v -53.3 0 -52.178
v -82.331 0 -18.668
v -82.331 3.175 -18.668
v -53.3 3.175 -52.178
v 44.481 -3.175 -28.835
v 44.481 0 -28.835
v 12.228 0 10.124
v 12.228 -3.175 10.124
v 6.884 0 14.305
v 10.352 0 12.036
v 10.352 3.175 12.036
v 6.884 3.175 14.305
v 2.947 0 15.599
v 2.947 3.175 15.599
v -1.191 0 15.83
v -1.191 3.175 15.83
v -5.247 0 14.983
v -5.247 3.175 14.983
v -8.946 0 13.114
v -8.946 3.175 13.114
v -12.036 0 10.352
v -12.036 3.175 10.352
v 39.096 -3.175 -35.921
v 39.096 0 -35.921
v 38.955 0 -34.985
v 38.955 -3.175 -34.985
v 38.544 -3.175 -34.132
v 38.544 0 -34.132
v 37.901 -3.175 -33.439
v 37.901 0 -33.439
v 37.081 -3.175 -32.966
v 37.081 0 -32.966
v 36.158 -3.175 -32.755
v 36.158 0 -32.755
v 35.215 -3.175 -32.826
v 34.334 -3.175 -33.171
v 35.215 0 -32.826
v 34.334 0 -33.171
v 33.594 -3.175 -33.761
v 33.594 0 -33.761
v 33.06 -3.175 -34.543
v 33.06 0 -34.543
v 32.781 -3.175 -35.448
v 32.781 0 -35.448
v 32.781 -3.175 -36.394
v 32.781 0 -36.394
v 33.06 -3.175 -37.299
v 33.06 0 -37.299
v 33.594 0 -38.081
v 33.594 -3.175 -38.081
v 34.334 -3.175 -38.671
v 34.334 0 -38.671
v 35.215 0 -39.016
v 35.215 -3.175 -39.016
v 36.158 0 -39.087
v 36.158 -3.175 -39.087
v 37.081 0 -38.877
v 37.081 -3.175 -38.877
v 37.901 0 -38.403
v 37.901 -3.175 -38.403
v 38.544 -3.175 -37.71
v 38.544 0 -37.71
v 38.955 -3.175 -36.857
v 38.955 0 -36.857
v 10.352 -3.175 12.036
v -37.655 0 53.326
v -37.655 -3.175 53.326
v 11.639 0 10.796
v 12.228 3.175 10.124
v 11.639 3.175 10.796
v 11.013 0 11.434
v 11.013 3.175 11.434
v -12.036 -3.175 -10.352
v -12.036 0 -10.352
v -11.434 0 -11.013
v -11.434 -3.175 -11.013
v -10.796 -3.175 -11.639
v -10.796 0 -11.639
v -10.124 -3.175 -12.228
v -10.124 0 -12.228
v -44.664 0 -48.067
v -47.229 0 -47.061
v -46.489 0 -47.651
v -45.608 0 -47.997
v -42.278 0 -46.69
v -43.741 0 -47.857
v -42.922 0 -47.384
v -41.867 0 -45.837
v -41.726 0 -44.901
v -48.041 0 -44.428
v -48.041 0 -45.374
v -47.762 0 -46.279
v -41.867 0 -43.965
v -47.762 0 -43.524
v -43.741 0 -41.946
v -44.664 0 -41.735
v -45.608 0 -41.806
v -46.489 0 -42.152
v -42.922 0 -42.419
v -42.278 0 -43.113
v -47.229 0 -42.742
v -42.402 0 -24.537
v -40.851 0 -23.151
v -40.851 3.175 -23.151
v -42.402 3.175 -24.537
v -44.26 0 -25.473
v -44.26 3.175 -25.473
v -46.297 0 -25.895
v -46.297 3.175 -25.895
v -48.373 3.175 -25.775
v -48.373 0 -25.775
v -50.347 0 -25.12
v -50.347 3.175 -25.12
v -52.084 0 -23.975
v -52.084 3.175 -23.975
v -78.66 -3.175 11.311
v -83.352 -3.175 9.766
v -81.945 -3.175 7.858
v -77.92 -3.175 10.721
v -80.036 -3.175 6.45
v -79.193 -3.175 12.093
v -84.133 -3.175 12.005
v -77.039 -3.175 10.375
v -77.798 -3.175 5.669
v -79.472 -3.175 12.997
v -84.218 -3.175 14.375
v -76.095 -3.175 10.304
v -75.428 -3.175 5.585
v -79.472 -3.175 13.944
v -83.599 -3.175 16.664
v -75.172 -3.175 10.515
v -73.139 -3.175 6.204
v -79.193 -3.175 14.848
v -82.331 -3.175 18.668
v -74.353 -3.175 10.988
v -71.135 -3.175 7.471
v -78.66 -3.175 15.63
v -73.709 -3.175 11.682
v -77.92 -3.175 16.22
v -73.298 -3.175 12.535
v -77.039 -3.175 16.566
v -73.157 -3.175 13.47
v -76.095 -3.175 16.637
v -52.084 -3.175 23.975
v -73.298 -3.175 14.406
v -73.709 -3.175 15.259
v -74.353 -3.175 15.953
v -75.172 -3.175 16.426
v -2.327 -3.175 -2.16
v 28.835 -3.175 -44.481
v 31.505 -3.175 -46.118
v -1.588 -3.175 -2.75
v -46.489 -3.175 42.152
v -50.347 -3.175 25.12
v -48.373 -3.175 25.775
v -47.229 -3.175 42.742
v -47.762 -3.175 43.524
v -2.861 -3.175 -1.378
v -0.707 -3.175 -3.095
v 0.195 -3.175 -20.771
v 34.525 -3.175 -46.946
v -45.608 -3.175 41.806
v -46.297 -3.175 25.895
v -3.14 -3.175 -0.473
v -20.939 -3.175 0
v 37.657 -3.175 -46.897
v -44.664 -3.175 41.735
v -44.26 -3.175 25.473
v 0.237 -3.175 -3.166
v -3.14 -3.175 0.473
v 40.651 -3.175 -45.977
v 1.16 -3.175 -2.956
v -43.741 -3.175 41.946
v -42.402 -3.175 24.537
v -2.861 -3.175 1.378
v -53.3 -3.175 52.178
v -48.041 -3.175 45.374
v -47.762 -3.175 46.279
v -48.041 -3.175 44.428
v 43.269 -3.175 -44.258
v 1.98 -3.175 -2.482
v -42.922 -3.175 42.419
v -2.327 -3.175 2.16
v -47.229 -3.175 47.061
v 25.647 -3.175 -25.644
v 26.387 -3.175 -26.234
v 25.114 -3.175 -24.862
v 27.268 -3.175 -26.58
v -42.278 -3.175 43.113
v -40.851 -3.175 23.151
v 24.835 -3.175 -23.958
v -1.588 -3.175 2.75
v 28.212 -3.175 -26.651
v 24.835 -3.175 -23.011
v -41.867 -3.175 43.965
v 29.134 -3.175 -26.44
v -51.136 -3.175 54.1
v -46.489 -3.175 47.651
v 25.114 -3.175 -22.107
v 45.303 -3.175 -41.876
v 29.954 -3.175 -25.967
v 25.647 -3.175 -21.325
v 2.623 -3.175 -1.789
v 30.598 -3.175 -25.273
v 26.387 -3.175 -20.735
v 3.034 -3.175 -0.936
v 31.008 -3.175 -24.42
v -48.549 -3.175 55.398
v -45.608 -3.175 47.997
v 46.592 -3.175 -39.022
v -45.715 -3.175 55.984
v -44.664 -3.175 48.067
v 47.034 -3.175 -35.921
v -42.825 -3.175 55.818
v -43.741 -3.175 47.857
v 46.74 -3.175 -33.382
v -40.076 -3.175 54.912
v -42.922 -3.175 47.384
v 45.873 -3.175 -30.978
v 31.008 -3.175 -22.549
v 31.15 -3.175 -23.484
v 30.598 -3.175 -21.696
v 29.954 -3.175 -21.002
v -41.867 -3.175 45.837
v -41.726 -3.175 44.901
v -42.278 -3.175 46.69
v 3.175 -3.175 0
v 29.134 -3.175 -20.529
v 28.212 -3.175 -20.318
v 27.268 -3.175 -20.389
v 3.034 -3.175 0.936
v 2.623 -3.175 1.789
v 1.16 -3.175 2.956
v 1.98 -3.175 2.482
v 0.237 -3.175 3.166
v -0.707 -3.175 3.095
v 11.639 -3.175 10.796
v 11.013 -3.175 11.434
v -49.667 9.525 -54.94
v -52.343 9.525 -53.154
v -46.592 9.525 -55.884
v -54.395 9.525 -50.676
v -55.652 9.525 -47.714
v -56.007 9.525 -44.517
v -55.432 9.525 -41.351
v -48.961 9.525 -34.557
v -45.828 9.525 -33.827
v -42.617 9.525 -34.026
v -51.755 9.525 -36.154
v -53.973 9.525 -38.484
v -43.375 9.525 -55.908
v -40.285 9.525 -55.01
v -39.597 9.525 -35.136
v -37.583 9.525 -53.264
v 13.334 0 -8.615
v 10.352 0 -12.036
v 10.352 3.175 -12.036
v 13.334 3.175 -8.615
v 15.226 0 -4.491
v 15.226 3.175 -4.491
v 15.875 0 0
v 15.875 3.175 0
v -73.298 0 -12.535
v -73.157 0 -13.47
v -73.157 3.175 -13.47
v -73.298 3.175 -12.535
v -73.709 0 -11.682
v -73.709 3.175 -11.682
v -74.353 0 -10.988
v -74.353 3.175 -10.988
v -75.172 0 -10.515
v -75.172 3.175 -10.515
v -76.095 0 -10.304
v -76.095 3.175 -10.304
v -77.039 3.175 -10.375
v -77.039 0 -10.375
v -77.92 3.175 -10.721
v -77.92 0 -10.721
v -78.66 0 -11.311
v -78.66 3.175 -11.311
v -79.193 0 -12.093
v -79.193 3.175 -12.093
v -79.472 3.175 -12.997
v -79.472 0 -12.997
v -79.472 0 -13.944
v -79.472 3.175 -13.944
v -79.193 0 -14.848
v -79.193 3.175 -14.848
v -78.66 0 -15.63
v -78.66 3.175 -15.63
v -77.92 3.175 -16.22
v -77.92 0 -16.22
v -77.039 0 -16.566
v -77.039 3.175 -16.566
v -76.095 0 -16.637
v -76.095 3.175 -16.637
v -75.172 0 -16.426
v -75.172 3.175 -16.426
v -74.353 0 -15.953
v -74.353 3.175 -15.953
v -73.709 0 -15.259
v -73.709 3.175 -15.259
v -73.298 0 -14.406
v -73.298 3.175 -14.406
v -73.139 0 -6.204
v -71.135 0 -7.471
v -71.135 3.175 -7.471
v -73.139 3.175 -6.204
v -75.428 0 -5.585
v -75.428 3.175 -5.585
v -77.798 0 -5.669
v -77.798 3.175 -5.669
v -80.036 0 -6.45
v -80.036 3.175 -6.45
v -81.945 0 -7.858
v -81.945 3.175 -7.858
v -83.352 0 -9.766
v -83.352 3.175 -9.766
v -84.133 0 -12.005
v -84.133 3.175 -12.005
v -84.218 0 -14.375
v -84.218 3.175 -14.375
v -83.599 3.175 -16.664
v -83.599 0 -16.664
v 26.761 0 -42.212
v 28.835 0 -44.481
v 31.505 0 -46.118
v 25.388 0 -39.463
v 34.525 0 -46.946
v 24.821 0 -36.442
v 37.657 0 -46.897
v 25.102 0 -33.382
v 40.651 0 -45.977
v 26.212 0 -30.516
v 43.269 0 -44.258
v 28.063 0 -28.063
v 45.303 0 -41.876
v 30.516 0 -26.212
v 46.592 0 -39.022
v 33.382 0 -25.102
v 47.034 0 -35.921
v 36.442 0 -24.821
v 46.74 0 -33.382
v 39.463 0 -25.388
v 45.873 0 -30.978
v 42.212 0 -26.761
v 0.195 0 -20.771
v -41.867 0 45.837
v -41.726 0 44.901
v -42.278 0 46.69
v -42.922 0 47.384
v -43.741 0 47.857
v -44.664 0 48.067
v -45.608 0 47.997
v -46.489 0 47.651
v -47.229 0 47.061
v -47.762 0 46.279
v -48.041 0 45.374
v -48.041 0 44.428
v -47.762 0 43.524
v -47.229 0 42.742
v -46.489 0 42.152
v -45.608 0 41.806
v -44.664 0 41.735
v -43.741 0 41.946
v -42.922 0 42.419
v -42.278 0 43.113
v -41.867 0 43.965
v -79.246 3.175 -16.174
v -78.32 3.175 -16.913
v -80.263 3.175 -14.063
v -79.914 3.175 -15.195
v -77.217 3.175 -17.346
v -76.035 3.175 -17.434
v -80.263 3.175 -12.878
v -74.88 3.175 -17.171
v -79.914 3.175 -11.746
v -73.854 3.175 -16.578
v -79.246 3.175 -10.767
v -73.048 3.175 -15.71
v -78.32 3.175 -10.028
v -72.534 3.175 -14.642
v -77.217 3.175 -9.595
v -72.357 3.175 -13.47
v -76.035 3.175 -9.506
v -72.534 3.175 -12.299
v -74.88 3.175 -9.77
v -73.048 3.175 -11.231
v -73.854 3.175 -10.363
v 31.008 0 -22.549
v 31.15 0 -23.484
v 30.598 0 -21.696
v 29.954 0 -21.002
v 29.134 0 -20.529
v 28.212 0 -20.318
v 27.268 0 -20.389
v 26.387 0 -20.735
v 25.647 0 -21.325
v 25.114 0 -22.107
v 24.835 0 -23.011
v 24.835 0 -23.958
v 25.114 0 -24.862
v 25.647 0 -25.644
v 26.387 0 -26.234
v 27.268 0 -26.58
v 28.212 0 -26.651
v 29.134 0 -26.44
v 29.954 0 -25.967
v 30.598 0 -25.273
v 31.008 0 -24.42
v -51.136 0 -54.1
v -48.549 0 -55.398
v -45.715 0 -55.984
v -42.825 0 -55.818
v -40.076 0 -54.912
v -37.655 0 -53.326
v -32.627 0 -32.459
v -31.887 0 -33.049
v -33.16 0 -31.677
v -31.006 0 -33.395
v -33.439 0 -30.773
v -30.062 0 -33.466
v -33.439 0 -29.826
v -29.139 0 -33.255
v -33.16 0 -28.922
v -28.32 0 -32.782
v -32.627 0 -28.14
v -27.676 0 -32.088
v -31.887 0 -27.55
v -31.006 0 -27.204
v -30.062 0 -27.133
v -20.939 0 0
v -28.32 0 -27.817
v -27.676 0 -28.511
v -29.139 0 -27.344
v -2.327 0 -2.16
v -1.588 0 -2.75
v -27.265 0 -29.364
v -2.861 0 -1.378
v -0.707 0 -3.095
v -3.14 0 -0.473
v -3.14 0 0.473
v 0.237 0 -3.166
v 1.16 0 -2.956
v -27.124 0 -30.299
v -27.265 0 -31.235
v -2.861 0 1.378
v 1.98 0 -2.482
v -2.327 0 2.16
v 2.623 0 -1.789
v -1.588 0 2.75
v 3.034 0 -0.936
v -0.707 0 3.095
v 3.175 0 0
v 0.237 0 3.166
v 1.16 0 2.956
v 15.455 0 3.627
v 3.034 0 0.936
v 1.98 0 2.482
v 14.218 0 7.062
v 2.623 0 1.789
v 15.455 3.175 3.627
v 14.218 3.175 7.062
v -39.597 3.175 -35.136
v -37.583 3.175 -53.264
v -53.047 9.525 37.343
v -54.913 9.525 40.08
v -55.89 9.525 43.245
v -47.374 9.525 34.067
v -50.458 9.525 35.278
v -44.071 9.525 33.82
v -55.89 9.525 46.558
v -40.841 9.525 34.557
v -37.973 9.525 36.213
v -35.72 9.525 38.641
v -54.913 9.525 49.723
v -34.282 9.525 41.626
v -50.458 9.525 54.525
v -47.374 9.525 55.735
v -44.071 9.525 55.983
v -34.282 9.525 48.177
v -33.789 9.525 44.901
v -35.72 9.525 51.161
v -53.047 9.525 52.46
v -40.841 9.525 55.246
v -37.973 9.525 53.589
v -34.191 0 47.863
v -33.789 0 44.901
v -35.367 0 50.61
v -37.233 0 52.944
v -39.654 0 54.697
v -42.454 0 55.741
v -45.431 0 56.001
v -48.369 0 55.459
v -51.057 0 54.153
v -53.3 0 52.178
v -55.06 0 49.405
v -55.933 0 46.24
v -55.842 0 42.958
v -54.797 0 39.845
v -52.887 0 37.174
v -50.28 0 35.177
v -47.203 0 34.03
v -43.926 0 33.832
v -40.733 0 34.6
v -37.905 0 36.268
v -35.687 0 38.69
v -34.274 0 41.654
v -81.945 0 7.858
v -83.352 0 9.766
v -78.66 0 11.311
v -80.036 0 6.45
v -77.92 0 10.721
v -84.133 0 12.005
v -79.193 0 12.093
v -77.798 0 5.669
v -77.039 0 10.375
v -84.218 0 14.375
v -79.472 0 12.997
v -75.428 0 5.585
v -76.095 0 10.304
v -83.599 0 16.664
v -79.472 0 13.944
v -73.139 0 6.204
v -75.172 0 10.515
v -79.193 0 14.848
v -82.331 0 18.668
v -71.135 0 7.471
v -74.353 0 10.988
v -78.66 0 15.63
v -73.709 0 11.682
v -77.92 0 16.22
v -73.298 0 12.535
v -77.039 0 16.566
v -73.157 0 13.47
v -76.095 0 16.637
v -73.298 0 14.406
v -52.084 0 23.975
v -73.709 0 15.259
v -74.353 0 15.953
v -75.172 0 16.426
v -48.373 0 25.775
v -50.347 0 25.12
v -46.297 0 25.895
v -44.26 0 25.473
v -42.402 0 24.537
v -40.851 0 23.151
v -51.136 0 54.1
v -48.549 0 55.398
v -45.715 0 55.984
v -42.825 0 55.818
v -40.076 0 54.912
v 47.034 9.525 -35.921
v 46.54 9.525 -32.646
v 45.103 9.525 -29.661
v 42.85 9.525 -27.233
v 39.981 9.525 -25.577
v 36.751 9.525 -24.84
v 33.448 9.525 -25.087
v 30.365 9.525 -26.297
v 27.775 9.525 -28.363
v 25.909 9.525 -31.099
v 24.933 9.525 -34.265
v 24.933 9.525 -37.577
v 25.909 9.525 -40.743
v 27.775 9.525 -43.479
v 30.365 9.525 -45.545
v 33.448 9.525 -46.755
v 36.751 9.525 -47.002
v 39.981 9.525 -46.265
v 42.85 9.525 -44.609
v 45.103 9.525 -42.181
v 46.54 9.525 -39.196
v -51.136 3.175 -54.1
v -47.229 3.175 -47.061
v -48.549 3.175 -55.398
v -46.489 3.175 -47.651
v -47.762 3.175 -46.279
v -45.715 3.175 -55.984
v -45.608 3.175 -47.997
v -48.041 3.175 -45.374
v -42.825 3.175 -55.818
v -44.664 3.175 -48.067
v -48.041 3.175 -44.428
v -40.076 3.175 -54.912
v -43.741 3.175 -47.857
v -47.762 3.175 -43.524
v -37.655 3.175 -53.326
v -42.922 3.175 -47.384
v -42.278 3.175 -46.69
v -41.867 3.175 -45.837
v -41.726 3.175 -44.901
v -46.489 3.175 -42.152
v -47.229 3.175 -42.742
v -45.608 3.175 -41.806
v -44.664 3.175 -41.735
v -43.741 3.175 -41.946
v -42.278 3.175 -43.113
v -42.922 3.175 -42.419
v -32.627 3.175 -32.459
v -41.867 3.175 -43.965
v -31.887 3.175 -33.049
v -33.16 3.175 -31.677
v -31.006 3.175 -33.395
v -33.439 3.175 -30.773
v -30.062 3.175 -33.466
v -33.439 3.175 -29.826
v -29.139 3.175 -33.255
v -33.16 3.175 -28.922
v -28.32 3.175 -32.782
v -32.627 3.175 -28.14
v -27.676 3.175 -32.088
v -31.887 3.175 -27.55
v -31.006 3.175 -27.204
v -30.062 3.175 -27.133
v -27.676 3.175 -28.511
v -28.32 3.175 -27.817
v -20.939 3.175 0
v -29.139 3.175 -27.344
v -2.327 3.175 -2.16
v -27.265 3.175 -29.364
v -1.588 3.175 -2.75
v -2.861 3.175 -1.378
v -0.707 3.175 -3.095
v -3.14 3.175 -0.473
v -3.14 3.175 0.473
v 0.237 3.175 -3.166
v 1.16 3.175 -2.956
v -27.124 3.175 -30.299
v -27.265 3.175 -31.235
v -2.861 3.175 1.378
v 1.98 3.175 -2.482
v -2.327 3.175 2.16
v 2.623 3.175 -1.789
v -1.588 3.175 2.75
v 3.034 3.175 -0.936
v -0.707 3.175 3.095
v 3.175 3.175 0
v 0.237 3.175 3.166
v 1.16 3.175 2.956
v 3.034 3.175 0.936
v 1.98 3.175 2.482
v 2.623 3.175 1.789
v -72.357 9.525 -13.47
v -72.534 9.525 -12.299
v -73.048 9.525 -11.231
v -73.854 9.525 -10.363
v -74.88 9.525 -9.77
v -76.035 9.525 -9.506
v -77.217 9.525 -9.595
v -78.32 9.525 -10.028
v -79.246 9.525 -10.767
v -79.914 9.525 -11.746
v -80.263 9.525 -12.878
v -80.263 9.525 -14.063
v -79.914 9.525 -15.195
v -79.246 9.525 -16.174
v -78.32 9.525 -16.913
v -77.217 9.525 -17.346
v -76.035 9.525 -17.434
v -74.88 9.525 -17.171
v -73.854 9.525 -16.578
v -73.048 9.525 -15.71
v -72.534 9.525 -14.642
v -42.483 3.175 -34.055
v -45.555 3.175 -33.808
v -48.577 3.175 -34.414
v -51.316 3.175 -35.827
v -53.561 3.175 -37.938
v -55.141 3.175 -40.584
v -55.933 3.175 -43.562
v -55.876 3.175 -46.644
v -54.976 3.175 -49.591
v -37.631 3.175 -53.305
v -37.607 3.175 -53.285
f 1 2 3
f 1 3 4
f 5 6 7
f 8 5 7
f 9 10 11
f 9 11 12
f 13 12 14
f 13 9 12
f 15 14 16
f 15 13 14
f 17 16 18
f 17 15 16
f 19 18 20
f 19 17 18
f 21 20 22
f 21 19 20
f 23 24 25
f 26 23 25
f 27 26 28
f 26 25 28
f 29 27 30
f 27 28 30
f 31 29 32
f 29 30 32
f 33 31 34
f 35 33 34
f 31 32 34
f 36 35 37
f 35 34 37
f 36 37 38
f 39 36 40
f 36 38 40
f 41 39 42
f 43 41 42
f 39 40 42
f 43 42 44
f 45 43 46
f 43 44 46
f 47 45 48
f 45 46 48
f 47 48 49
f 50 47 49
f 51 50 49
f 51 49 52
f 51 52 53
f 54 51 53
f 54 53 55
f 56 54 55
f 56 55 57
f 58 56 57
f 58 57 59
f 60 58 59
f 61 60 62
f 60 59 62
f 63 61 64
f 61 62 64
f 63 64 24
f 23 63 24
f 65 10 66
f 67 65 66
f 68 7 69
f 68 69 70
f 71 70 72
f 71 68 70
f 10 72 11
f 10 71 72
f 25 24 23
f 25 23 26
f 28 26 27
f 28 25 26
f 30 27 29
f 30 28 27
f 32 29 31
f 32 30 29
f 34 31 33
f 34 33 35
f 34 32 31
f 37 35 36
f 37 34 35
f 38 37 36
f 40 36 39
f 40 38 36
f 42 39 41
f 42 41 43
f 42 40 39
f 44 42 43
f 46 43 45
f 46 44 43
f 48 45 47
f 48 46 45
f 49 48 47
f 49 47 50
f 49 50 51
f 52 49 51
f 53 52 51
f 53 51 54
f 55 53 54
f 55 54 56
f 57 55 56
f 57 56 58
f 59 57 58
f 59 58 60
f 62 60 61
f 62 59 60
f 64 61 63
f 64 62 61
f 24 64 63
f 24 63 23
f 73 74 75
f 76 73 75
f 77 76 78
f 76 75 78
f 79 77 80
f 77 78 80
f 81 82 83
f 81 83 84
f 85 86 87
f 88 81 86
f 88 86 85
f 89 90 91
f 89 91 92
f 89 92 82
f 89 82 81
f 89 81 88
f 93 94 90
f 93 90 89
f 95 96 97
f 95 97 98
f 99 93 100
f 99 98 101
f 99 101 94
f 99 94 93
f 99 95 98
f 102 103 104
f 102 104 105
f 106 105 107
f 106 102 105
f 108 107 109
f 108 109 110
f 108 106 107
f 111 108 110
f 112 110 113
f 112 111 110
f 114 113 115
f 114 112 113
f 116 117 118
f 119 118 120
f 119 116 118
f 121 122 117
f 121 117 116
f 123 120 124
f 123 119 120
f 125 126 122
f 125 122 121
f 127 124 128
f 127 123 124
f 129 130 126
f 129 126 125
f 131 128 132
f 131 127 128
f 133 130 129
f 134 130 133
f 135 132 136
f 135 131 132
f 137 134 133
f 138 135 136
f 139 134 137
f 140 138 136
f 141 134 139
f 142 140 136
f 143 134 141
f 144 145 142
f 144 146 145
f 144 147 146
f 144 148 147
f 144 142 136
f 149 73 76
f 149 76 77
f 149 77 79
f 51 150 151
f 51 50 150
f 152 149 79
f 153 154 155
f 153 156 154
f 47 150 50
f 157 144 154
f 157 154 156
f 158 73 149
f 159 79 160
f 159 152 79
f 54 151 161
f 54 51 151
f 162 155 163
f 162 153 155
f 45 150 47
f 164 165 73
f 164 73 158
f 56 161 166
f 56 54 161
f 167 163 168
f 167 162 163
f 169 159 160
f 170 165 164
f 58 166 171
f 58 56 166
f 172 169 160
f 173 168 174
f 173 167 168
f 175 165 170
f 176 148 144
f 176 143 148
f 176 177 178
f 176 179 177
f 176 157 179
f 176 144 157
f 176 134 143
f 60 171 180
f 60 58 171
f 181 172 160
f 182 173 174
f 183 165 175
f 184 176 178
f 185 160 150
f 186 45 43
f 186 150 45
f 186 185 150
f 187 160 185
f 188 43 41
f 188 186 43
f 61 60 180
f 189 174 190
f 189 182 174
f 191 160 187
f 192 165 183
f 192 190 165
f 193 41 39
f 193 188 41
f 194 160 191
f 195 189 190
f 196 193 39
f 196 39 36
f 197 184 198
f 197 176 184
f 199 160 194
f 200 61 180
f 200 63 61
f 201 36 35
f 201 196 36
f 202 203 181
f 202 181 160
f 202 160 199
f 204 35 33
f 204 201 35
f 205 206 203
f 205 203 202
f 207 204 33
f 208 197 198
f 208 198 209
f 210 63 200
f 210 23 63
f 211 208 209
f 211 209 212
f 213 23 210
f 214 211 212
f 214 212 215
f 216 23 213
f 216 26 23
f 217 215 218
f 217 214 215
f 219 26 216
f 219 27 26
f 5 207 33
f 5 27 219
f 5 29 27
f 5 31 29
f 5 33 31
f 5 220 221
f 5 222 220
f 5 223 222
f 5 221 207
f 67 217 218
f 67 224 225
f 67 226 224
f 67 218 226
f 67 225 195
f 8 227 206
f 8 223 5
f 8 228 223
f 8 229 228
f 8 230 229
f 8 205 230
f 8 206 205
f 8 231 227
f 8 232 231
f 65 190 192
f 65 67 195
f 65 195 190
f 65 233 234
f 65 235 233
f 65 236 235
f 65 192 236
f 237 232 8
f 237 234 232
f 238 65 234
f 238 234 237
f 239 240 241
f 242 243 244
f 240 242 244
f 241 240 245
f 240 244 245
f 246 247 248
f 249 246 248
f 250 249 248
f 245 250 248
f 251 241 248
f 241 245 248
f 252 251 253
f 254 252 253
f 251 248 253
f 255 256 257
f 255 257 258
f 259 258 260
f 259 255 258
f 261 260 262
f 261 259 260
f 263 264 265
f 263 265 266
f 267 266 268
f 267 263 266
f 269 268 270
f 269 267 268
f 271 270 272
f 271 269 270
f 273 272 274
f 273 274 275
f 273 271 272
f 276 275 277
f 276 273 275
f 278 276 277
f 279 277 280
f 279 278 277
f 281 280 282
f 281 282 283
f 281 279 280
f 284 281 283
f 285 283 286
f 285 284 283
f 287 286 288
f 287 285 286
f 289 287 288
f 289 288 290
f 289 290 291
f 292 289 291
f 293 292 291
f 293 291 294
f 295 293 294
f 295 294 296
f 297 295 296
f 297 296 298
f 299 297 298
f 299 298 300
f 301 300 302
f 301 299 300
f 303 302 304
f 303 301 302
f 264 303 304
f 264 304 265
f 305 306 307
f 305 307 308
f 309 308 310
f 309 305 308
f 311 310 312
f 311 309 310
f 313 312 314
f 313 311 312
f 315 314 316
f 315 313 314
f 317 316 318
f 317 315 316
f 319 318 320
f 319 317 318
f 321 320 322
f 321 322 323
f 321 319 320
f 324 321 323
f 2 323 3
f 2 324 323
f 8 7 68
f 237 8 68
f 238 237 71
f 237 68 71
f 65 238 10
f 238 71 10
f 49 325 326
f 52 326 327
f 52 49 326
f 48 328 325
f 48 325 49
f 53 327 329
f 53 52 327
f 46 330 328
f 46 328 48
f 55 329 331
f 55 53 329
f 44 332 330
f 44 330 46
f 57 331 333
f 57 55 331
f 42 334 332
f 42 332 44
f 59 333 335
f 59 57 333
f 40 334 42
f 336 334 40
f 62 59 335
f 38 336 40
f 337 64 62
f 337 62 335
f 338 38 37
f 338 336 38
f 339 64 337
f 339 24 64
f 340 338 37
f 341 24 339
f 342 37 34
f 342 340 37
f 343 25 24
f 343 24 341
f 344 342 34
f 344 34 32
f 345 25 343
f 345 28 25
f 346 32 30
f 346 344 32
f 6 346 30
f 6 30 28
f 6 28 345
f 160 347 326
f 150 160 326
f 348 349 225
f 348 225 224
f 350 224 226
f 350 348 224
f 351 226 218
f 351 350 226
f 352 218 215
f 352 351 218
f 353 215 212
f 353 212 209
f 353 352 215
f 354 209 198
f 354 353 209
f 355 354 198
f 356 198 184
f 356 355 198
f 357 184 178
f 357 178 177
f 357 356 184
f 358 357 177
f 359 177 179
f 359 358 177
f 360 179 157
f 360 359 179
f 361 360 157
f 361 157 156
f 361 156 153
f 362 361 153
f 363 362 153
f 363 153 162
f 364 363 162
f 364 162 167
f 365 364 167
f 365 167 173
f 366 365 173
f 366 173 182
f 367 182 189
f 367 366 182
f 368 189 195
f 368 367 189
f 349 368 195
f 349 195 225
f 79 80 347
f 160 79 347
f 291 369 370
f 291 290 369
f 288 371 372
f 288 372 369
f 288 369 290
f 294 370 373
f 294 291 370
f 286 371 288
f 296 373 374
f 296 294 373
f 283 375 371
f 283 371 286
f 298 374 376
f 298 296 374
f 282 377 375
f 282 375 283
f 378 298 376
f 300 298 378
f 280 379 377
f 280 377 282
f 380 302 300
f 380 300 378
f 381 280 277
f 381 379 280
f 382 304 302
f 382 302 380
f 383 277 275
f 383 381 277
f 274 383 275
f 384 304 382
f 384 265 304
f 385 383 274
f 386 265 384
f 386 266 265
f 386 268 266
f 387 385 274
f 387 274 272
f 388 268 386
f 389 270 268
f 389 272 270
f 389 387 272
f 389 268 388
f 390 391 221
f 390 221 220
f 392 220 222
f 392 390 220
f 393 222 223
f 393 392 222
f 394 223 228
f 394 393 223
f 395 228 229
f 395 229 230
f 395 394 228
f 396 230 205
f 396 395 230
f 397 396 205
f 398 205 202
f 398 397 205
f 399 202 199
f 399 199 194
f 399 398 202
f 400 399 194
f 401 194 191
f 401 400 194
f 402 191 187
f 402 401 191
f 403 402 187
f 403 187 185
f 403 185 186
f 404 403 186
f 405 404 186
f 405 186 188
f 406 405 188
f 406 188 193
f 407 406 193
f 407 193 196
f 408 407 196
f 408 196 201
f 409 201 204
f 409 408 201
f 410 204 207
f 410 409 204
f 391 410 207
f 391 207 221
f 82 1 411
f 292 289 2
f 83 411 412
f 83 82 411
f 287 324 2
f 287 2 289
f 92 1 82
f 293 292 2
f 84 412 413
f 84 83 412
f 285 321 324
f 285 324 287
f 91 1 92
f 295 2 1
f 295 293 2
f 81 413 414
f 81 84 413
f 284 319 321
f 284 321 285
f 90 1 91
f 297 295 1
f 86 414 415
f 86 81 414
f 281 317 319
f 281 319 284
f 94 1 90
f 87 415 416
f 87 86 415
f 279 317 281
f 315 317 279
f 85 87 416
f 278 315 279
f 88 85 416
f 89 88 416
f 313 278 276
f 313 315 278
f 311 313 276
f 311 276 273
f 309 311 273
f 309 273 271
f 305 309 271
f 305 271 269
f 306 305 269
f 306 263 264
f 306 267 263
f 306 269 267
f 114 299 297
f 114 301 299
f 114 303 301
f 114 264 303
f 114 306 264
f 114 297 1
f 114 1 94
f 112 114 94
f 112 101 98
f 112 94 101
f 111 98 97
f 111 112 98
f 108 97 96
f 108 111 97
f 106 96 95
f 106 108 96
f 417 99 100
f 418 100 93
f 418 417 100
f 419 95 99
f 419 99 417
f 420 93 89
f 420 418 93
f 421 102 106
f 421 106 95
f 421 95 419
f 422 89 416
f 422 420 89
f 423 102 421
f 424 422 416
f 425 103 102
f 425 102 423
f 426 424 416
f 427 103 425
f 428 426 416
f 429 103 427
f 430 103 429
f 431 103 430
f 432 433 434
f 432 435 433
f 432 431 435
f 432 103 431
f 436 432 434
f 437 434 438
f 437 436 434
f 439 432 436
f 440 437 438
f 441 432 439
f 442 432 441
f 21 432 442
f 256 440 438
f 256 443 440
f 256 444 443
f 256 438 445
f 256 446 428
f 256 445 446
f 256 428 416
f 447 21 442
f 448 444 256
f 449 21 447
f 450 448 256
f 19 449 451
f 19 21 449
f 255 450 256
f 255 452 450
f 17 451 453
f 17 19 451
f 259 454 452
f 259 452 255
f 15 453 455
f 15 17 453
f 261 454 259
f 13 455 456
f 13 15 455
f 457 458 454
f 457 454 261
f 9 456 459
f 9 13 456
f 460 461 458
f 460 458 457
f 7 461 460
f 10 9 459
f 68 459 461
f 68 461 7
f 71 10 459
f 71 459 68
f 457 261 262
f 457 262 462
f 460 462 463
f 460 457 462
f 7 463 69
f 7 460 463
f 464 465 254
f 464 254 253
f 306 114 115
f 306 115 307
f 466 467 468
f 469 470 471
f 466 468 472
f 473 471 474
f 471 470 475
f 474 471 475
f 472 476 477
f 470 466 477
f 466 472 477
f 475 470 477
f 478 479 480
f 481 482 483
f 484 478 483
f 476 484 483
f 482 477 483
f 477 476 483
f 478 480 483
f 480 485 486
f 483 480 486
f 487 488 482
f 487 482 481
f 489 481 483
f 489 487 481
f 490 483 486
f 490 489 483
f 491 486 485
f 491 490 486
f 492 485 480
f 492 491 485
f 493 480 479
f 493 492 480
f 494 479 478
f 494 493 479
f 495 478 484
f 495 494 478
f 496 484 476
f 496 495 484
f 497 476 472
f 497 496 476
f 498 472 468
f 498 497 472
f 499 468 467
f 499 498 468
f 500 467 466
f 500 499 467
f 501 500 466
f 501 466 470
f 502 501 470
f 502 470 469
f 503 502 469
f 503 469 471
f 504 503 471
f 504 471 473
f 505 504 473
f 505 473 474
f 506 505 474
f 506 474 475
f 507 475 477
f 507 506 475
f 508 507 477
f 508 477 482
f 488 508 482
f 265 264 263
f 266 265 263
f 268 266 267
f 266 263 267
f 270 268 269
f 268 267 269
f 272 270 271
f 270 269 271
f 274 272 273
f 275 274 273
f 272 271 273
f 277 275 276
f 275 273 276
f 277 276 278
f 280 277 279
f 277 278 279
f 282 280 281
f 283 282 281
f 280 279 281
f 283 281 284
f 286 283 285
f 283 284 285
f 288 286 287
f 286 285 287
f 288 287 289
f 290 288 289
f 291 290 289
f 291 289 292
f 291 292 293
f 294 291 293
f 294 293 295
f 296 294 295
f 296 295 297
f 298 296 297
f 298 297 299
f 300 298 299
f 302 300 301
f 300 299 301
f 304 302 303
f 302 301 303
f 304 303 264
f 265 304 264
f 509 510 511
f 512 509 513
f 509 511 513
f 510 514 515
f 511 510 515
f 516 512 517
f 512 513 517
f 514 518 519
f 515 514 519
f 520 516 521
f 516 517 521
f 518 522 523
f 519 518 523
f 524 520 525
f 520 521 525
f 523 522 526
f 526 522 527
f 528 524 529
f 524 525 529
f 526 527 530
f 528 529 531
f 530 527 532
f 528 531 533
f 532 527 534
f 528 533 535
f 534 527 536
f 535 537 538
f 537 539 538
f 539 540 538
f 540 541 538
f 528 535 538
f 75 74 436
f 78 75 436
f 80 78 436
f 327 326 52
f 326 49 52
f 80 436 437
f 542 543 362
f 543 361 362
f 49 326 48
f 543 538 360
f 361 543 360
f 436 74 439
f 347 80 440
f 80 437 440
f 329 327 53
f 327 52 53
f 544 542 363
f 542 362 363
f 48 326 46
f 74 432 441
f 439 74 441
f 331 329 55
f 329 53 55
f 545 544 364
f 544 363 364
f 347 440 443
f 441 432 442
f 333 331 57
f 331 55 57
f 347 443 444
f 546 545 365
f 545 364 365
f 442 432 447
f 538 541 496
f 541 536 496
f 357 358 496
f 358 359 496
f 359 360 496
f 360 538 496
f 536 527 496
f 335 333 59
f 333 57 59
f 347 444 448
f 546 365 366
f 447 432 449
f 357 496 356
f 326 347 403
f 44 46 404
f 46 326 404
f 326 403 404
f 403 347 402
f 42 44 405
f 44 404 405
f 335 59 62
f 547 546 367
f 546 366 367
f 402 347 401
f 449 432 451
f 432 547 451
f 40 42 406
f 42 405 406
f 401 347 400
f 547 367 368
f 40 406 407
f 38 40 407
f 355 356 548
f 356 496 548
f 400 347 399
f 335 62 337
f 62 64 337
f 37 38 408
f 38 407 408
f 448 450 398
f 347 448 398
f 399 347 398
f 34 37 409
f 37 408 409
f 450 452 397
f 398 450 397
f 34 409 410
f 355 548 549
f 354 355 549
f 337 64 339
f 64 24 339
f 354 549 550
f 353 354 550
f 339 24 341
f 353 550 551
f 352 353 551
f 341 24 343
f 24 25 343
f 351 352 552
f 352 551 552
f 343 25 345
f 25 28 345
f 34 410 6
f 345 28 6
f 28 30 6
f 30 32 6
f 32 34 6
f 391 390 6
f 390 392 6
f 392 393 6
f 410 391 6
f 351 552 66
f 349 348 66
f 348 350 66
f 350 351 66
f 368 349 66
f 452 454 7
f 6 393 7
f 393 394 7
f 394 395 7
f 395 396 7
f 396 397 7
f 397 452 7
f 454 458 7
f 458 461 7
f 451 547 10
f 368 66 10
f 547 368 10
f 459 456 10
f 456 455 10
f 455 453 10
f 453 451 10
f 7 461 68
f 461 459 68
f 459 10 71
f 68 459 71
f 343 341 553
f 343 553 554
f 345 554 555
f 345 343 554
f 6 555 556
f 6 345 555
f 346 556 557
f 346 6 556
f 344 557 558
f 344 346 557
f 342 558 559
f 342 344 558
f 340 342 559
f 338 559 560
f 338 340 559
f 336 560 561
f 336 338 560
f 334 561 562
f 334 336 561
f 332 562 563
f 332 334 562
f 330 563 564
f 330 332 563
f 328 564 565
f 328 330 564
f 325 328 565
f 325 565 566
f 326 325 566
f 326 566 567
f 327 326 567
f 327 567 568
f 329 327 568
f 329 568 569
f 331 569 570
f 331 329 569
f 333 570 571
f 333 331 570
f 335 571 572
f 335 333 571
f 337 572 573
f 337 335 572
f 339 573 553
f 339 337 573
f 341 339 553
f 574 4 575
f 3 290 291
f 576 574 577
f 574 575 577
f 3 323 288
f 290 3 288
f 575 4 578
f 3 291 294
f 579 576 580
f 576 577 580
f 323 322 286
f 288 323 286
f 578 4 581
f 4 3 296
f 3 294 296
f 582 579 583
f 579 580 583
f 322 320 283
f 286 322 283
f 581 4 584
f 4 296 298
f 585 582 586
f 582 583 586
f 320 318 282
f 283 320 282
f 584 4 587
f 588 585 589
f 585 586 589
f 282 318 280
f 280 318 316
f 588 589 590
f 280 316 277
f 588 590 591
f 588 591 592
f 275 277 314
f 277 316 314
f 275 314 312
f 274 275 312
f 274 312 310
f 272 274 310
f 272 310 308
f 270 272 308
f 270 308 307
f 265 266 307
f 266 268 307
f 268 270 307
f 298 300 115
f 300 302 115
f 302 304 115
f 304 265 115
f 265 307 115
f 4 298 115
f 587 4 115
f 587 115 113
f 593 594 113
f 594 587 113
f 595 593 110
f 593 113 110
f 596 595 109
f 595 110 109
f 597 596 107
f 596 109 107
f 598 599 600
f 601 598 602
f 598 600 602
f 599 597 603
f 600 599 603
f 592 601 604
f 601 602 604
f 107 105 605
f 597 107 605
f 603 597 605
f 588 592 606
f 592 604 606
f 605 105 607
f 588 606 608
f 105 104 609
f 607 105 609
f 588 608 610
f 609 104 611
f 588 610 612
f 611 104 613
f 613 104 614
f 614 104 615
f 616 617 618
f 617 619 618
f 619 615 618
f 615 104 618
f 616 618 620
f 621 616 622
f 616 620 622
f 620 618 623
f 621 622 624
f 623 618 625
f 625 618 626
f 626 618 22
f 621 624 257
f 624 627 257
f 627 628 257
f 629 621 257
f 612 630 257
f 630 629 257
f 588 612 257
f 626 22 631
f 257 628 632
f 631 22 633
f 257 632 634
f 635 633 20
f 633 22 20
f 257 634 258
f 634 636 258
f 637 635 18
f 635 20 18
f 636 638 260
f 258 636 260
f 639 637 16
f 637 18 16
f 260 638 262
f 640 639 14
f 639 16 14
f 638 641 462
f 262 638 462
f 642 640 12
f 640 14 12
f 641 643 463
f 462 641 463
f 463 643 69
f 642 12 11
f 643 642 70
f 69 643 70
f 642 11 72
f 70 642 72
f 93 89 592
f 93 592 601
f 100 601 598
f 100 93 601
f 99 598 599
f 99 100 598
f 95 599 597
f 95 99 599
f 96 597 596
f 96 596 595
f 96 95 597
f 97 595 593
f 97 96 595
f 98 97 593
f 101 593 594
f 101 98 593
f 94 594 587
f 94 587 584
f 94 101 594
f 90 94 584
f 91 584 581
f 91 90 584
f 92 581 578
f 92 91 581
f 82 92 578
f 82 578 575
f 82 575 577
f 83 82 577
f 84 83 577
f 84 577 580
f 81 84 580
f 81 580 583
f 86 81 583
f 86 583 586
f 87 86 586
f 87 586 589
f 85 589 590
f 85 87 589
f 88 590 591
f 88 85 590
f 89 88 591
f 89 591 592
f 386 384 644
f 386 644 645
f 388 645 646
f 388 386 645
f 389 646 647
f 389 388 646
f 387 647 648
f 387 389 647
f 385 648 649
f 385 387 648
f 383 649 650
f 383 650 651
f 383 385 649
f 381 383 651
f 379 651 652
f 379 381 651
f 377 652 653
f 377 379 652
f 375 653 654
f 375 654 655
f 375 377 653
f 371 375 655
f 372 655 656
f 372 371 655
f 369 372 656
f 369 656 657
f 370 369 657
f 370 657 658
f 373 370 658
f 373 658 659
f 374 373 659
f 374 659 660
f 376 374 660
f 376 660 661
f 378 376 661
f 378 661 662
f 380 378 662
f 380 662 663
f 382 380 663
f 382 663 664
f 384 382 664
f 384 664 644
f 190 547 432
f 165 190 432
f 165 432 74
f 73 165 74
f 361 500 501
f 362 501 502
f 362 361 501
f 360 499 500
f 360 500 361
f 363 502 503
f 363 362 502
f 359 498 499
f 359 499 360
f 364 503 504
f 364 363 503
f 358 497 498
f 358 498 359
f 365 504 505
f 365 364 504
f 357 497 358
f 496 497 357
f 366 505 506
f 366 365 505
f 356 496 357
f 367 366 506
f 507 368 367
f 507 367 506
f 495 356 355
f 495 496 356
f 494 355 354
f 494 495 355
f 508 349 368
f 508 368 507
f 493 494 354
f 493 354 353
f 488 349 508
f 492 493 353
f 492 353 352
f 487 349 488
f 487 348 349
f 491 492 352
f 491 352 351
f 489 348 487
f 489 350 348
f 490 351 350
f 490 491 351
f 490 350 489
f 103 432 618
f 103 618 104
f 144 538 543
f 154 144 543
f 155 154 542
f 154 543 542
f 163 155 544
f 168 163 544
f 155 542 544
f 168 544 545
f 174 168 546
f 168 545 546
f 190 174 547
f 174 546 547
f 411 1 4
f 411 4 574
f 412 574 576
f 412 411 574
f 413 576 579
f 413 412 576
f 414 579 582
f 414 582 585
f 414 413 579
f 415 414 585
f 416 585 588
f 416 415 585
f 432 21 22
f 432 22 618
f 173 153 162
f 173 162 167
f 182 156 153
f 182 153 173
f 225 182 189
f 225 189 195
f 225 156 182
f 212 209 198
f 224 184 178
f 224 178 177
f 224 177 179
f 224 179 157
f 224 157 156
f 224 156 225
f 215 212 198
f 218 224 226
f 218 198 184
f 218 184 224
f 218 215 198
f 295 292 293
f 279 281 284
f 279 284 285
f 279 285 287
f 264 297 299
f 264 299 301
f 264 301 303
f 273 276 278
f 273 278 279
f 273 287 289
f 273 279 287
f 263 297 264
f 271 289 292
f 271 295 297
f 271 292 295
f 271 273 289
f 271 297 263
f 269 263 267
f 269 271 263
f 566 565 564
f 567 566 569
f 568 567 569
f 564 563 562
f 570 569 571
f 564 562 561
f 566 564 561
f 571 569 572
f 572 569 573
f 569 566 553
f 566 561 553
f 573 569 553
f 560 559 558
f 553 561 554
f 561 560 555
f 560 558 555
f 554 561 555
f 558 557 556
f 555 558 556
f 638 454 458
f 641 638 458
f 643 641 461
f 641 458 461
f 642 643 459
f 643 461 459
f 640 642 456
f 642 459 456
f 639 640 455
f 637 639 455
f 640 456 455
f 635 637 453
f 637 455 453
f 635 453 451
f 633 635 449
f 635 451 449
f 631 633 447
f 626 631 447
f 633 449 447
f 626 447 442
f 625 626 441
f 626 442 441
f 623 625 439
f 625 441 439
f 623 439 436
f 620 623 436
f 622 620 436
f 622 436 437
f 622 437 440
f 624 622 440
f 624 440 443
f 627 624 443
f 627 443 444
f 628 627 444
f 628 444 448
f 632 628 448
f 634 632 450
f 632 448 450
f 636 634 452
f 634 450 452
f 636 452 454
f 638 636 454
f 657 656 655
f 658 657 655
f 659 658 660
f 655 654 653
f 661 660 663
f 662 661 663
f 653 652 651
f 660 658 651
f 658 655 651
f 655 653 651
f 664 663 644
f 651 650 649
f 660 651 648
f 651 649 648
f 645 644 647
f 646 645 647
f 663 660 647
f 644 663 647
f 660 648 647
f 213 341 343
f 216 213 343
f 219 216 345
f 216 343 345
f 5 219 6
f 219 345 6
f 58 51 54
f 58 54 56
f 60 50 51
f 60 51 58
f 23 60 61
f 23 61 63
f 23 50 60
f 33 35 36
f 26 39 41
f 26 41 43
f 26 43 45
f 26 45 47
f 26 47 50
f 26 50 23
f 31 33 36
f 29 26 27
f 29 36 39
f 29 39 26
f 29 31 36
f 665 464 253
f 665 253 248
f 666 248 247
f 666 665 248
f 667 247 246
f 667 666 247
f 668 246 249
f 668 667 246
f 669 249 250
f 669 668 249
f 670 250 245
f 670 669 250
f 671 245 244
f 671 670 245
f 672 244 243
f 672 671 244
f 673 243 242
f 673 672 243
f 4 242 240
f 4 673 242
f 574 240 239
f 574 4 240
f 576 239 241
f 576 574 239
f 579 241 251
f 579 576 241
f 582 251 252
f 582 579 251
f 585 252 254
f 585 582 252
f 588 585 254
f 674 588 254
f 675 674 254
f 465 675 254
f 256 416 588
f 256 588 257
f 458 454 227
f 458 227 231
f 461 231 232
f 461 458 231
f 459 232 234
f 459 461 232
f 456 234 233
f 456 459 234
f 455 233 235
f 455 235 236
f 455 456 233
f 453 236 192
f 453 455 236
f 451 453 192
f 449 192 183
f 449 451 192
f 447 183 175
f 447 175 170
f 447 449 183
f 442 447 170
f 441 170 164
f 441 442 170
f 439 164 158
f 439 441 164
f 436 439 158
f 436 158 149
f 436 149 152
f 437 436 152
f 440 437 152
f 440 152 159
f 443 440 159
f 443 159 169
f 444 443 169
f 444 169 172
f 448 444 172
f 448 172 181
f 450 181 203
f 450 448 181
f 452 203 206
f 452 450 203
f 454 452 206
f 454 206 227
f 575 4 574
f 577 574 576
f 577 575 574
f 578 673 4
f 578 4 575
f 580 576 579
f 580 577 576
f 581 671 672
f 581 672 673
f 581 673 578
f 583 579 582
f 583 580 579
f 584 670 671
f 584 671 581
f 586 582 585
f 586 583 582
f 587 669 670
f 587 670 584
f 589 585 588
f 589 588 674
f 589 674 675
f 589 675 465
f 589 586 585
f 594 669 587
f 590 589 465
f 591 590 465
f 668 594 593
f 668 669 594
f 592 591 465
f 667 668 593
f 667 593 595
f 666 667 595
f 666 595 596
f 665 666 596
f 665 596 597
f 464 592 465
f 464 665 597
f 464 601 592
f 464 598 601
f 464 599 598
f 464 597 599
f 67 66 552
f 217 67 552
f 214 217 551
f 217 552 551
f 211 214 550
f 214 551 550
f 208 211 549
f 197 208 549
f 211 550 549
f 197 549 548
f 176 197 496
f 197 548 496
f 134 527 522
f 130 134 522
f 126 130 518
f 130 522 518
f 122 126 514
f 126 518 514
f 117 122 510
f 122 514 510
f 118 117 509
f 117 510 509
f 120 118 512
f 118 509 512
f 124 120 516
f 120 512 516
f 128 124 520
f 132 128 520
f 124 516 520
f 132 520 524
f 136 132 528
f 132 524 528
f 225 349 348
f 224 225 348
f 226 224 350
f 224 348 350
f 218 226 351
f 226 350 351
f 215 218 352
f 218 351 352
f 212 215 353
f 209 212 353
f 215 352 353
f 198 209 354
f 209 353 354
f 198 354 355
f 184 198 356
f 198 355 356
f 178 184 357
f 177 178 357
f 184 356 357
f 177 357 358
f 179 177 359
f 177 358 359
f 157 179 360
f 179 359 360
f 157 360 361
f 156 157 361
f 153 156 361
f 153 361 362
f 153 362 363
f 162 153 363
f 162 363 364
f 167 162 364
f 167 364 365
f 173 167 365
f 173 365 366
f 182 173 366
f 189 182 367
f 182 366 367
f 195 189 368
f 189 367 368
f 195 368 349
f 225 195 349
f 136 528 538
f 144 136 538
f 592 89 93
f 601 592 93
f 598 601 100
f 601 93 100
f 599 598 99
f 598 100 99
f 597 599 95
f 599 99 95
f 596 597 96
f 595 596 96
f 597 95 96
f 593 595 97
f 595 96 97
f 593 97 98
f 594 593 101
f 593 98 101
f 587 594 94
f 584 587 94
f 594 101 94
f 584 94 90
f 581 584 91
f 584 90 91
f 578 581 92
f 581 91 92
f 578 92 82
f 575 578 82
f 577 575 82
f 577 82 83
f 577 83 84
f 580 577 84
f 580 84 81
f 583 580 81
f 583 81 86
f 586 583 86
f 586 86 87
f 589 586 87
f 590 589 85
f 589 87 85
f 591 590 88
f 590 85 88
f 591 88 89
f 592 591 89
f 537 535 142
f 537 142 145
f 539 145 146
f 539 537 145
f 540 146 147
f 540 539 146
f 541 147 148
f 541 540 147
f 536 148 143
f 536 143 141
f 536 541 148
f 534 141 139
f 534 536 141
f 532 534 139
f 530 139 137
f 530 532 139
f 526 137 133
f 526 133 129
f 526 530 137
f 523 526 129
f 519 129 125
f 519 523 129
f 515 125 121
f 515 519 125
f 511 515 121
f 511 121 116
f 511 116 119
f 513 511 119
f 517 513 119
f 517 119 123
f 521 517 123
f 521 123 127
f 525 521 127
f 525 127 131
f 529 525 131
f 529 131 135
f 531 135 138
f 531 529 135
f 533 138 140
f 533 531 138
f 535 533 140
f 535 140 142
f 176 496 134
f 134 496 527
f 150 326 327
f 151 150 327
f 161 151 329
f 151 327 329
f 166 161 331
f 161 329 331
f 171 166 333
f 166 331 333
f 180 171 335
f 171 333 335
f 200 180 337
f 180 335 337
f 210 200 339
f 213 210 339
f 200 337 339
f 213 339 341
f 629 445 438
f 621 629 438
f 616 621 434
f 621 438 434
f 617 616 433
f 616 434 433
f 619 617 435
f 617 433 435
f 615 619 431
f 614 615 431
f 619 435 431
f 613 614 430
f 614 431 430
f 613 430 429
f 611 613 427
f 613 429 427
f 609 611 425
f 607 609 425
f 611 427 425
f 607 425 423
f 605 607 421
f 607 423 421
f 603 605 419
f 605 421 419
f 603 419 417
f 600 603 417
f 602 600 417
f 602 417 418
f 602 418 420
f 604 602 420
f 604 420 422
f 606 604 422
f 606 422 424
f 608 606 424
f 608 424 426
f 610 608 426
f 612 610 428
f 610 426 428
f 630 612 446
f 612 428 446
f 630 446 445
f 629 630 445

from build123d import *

# Parameters (mm, degrees)
F0_R     = 3.175
F0_R_2   = 3.9751
F1_DEPTH = 3.175
F2_DEPTH = 3.175
F5_DEPTH = 9.525
F3_R     = 3.9751
F6_R     = 11.1125
F7_DEPTH = 12.7


with BuildPart() as f1:
    # F0 (on Front) → F1 (new body)
    with BuildSketch(Plane.XZ):
        with BuildLine():
            ThreePointArc((-82.331405076, 18.6678036462), (-73.5586383483, 20.9075469092), (-68.3946770291, 13.4703841816))
            ThreePointArc((-68.3946770291, 13.4703841816), (-69.1121208226, 10.1727039932), (-71.1347575644, 7.4711561347))
            Line((-71.1347575644, 7.4711561347), (-52.0843267669, 23.9754595323))
            ThreePointArc((-52.0843267669, 23.9754595323), (-46.2965222838, 25.8954961667), (-40.8511612346, 23.1508168672))
            Line((-40.8511612346, 23.1508168672), (-20.9391765456, 0))
            Line((-20.9391765456, 0), (-12.0356034274, 10.3518054047))
            ThreePointArc((-12.0356034274, 10.3518054047), (-1.190625, 15.8302885984), (10.3518054047, 12.0356034274))
            Line((10.3518054047, 12.0356034274), (-37.655016822, 53.3262030046))
            ThreePointArc((-37.655016822, 53.3262030046), (-34.8014845049, 49.5361241819), (-33.7887806053, 44.9012806053))
            ThreePointArc((-33.7887806053, 44.9012806053), (-48.7842347585, 34.4892527868), (-53.300199871, 52.1776678558))
            Line((-53.300199871, 52.1776678558), (-82.331405076, 18.6678036462))
        make_face()
        with BuildLine():
            ThreePointArc((-37.655016822, 53.3262030046), (-45.7148756595, 55.9839571475), (-53.300199871, 52.1776678558))
            ThreePointArc((-53.300199871, 52.1776678558), (-48.7842347585, 34.4892527868), (-33.7887806053, 44.9012806053))
            ThreePointArc((-33.7887806053, 44.9012806053), (-34.8014845049, 49.5361241819), (-37.655016822, 53.3262030046))
        make_face()
        with Locations((-44.9012806053, 44.9012806053)):
            Circle(F0_R, mode=Mode.SUBTRACT)
        with BuildLine():
            ThreePointArc((-71.1347575644, 7.4711561347), (-69.1121208226, 10.1727039932), (-68.3946770291, 13.4703841816))
            ThreePointArc((-68.3946770291, 13.4703841816), (-73.5586383483, 20.9075469092), (-82.331405076, 18.6678036462))
            ThreePointArc((-82.331405076, 18.6678036462), (-81.9448371048, 7.8577241059), (-71.1347575644, 7.4711561347))
        make_face()
        with Locations((-76.3321770291, 13.4703841816)):
            Circle(F0_R, mode=Mode.SUBTRACT)
        with BuildLine():
            ThreePointArc((12.2282550252, 10.1235074968), (11.3304373246, 11.1192092809), (10.3518054047, 12.0356034274))
            ThreePointArc((10.3518054047, 12.0356034274), (-1.190625, 15.8302885984), (-12.0356034274, 10.3518054047))
            ThreePointArc((-12.0356034274, 10.3518054047), (-15.875, 0), (-12.0356034274, -10.3518054047))
            ThreePointArc((-12.0356034274, -10.3518054047), (-11.1192092809, -11.3304373246), (-10.1235074968, -12.2282550252))
            ThreePointArc((-10.1235074968, -12.2282550252), (0.1493607821, -15.87429735), (10.3518054047, -12.0356034274))
            ThreePointArc((10.3518054047, -12.0356034274), (14.4282801435, -6.6212051093), (15.875, 0))
            ThreePointArc((15.875, 0), (14.9355142785, 5.3801522504), (12.2282550252, 10.1235074968))
        make_face()
        Circle(F0_R_2, mode=Mode.SUBTRACT)
        with BuildLine():
            Line((44.4808030019, -28.8345692365), (12.2282550252, 10.1235074968))
            ThreePointArc((12.2282550252, 10.1235074968), (14.9355142785, 5.3801522504), (15.875, 0))
            ThreePointArc((15.875, 0), (14.4282801435, -6.6212051093), (10.3518054047, -12.0356034274))
            Line((10.3518054047, -12.0356034274), (0.1954344954, -20.7710836138))
            Line((0.1954344954, -20.7710836138), (28.8345692365, -44.4808030019))
            ThreePointArc((28.8345692365, -44.4808030019), (28.0633003783, -28.0633003783), (44.4808030019, -28.8345692365))
        make_face()
        with Locations((27.9745180668, -23.4843900063)):
            Circle(F0_R, mode=Mode.SUBTRACT)
        with BuildLine():
            ThreePointArc((47.0335244843, -35.9210244843), (46.3758844792, -32.154917909), (44.4808030019, -28.8345692365))
            ThreePointArc((44.4808030019, -28.8345692365), (28.0633003783, -28.0633003783), (28.8345692365, -44.4808030019))
            ThreePointArc((28.8345692365, -44.4808030019), (40.650687385, -45.9767663811), (47.0335244843, -35.9210244843))
        make_face()
        with Locations((35.9210244843, -35.9210244843)):
            Circle(F0_R, mode=Mode.SUBTRACT)
        with BuildLine():
            ThreePointArc((10.3518054047, -12.0356034274), (0.1493607821, -15.87429735), (-10.1235074968, -12.2282550252))
            Line((-10.1235074968, -12.2282550252), (0.1954344954, -20.7710836138))
            Line((0.1954344954, -20.7710836138), (10.3518054047, -12.0356034274))
        make_face()
        with BuildLine():
            Line((-12.0356034274, 10.3518054047), (-20.9391765456, 0))
            Line((-20.9391765456, 0), (-12.0356034274, -10.3518054047))
            ThreePointArc((-12.0356034274, -10.3518054047), (-15.875, 0), (-12.0356034274, 10.3518054047))
        make_face()
        Circle(F0_R_2)
        Circle(F0_R, mode=Mode.SUBTRACT)
    extrude(amount=F1_DEPTH)


with BuildPart() as f2:
    # F0 (on Front) → F2 (new body)
    with BuildSketch(Plane.XZ):
        with BuildLine():
            Line((-12.0356034274, -10.3518054047), (-20.9391765456, 0))
            Line((-20.9391765456, 0), (-40.8511612346, -23.1508168672))
            ThreePointArc((-40.8511612346, -23.1508168672), (-46.2965222838, -25.8954961667), (-52.0843267669, -23.9754595323))
            Line((-52.0843267669, -23.9754595323), (-71.1347575644, -7.4711561347))
            ThreePointArc((-71.1347575644, -7.4711561347), (-69.1121208226, -10.1727039932), (-68.3946770291, -13.4703841816))
            ThreePointArc((-68.3946770291, -13.4703841816), (-73.5586383483, -20.9075469092), (-82.331405076, -18.6678036462))
            Line((-82.331405076, -18.6678036462), (-53.300199871, -52.1776678559))
            ThreePointArc((-53.300199871, -52.1776678559), (-48.7842347585, -34.4892527868), (-33.7887806053, -44.9012806053))
            ThreePointArc((-33.7887806053, -44.9012806053), (-34.8014845049, -49.5361241819), (-37.655016822, -53.3262030046))
            Line((-37.655016822, -53.3262030046), (0.1954344954, -20.7710836138))
            Line((0.1954344954, -20.7710836138), (-10.1235074968, -12.2282550252))
            ThreePointArc((-10.1235074968, -12.2282550252), (-11.1192092809, -11.3304373246), (-12.0356034274, -10.3518054047))
        make_face()
        with Locations((-30.2993841525, -30.2993841525)):
            Circle(F0_R, mode=Mode.SUBTRACT)
        with BuildLine():
            ThreePointArc((-53.300199871, -52.1776678559), (-45.7148756595, -55.9839571475), (-37.655016822, -53.3262030046))
            ThreePointArc((-37.655016822, -53.3262030046), (-34.8014845049, -49.5361241819), (-33.7887806053, -44.9012806053))
            ThreePointArc((-33.7887806053, -44.9012806053), (-48.7842347585, -34.4892527868), (-53.300199871, -52.1776678559))
        make_face()
        with Locations((-44.9012806053, -44.9012806053)):
            Circle(F0_R, mode=Mode.SUBTRACT)
        with BuildLine():
            ThreePointArc((-68.3946770291, -13.4703841816), (-69.1121208226, -10.1727039932), (-71.1347575644, -7.4711561347))
            ThreePointArc((-71.1347575644, -7.4711561347), (-81.9448371048, -7.8577241059), (-82.331405076, -18.6678036462))
            ThreePointArc((-82.331405076, -18.6678036462), (-73.5586383483, -20.9075469092), (-68.3946770291, -13.4703841816))
        make_face()
        with Locations((-76.3321770291, -13.4703841816)):
            Circle(F0_R, mode=Mode.SUBTRACT)
        with BuildLine():
            ThreePointArc((12.2282550252, 10.1235074968), (11.3304373246, 11.1192092809), (10.3518054047, 12.0356034274))
            ThreePointArc((10.3518054047, 12.0356034274), (-1.190625, 15.8302885984), (-12.0356034274, 10.3518054047))
            ThreePointArc((-12.0356034274, 10.3518054047), (-15.875, 0), (-12.0356034274, -10.3518054047))
            ThreePointArc((-12.0356034274, -10.3518054047), (-11.1192092809, -11.3304373246), (-10.1235074968, -12.2282550252))
            ThreePointArc((-10.1235074968, -12.2282550252), (0.1493607821, -15.87429735), (10.3518054047, -12.0356034274))
            ThreePointArc((10.3518054047, -12.0356034274), (14.4282801435, -6.6212051093), (15.875, 0))
            ThreePointArc((15.875, 0), (14.9355142785, 5.3801522504), (12.2282550252, 10.1235074968))
        make_face()
        Circle(F0_R_2, mode=Mode.SUBTRACT)
        with BuildLine():
            Line((-12.0356034274, 10.3518054047), (-20.9391765456, 0))
            Line((-20.9391765456, 0), (-12.0356034274, -10.3518054047))
            ThreePointArc((-12.0356034274, -10.3518054047), (-15.875, 0), (-12.0356034274, 10.3518054047))
        make_face()
        with BuildLine():
            ThreePointArc((10.3518054047, -12.0356034274), (0.1493607821, -15.87429735), (-10.1235074968, -12.2282550252))
            Line((-10.1235074968, -12.2282550252), (0.1954344954, -20.7710836138))
            Line((0.1954344954, -20.7710836138), (10.3518054047, -12.0356034274))
        make_face()
        Circle(F0_R_2)
        Circle(F0_R, mode=Mode.SUBTRACT)
    extrude(amount=-F2_DEPTH)


with BuildPart() as f5:
    # F3 (on Front) → F5 (new body, through all)
    with BuildSketch(Plane.XZ):
        with BuildLine():
            Line((-37.5830393389, -53.2637563761), (-39.5971984414, -35.1363244535))
            ThreePointArc((-39.5971984414, -35.1363244535), (-55.9458136069, -46.1284509389), (-37.5830393389, -53.2637563761))
        make_face()
    extrude(amount=-F5_DEPTH)

    # F10: cut F2
    add(f2.part, mode=Mode.SUBTRACT)


with BuildPart() as f5b:
    # F3 (on Front) → F5, piece 2 (new body, through all)
    with BuildSketch(Plane.XZ):
        with Locations((-76.3321770291, -13.4703841816)):
            Circle(F3_R)
    extrude(amount=-F5_DEPTH)

    # F11: cut F2
    add(f2.part, mode=Mode.SUBTRACT)


with BuildPart() as f7:
    # F6 (on face) → F7 (new body, through all)
    with BuildSketch(Plane.XZ.offset(3.175)):
        with Locations((35.9210244843, -35.9210244843)):
            Circle(F6_R)
    extrude(amount=-F7_DEPTH)

    # F8: cut F1
    add(f1.part, mode=Mode.SUBTRACT)


with BuildPart() as f7b:
    # F6 (on face) → F7, piece 2 (new body, through all)
    with BuildSketch(Plane.XZ.offset(3.175)):
        with Locations((-44.9012806053, 44.9012806053)):
            Circle(F6_R)
    extrude(amount=-F7_DEPTH)

    # F9: cut F1
    add(f1.part, mode=Mode.SUBTRACT)


solid = Compound([f1.part, f2.part, f5.part, f5b.part, f7.part, f7b.part])
